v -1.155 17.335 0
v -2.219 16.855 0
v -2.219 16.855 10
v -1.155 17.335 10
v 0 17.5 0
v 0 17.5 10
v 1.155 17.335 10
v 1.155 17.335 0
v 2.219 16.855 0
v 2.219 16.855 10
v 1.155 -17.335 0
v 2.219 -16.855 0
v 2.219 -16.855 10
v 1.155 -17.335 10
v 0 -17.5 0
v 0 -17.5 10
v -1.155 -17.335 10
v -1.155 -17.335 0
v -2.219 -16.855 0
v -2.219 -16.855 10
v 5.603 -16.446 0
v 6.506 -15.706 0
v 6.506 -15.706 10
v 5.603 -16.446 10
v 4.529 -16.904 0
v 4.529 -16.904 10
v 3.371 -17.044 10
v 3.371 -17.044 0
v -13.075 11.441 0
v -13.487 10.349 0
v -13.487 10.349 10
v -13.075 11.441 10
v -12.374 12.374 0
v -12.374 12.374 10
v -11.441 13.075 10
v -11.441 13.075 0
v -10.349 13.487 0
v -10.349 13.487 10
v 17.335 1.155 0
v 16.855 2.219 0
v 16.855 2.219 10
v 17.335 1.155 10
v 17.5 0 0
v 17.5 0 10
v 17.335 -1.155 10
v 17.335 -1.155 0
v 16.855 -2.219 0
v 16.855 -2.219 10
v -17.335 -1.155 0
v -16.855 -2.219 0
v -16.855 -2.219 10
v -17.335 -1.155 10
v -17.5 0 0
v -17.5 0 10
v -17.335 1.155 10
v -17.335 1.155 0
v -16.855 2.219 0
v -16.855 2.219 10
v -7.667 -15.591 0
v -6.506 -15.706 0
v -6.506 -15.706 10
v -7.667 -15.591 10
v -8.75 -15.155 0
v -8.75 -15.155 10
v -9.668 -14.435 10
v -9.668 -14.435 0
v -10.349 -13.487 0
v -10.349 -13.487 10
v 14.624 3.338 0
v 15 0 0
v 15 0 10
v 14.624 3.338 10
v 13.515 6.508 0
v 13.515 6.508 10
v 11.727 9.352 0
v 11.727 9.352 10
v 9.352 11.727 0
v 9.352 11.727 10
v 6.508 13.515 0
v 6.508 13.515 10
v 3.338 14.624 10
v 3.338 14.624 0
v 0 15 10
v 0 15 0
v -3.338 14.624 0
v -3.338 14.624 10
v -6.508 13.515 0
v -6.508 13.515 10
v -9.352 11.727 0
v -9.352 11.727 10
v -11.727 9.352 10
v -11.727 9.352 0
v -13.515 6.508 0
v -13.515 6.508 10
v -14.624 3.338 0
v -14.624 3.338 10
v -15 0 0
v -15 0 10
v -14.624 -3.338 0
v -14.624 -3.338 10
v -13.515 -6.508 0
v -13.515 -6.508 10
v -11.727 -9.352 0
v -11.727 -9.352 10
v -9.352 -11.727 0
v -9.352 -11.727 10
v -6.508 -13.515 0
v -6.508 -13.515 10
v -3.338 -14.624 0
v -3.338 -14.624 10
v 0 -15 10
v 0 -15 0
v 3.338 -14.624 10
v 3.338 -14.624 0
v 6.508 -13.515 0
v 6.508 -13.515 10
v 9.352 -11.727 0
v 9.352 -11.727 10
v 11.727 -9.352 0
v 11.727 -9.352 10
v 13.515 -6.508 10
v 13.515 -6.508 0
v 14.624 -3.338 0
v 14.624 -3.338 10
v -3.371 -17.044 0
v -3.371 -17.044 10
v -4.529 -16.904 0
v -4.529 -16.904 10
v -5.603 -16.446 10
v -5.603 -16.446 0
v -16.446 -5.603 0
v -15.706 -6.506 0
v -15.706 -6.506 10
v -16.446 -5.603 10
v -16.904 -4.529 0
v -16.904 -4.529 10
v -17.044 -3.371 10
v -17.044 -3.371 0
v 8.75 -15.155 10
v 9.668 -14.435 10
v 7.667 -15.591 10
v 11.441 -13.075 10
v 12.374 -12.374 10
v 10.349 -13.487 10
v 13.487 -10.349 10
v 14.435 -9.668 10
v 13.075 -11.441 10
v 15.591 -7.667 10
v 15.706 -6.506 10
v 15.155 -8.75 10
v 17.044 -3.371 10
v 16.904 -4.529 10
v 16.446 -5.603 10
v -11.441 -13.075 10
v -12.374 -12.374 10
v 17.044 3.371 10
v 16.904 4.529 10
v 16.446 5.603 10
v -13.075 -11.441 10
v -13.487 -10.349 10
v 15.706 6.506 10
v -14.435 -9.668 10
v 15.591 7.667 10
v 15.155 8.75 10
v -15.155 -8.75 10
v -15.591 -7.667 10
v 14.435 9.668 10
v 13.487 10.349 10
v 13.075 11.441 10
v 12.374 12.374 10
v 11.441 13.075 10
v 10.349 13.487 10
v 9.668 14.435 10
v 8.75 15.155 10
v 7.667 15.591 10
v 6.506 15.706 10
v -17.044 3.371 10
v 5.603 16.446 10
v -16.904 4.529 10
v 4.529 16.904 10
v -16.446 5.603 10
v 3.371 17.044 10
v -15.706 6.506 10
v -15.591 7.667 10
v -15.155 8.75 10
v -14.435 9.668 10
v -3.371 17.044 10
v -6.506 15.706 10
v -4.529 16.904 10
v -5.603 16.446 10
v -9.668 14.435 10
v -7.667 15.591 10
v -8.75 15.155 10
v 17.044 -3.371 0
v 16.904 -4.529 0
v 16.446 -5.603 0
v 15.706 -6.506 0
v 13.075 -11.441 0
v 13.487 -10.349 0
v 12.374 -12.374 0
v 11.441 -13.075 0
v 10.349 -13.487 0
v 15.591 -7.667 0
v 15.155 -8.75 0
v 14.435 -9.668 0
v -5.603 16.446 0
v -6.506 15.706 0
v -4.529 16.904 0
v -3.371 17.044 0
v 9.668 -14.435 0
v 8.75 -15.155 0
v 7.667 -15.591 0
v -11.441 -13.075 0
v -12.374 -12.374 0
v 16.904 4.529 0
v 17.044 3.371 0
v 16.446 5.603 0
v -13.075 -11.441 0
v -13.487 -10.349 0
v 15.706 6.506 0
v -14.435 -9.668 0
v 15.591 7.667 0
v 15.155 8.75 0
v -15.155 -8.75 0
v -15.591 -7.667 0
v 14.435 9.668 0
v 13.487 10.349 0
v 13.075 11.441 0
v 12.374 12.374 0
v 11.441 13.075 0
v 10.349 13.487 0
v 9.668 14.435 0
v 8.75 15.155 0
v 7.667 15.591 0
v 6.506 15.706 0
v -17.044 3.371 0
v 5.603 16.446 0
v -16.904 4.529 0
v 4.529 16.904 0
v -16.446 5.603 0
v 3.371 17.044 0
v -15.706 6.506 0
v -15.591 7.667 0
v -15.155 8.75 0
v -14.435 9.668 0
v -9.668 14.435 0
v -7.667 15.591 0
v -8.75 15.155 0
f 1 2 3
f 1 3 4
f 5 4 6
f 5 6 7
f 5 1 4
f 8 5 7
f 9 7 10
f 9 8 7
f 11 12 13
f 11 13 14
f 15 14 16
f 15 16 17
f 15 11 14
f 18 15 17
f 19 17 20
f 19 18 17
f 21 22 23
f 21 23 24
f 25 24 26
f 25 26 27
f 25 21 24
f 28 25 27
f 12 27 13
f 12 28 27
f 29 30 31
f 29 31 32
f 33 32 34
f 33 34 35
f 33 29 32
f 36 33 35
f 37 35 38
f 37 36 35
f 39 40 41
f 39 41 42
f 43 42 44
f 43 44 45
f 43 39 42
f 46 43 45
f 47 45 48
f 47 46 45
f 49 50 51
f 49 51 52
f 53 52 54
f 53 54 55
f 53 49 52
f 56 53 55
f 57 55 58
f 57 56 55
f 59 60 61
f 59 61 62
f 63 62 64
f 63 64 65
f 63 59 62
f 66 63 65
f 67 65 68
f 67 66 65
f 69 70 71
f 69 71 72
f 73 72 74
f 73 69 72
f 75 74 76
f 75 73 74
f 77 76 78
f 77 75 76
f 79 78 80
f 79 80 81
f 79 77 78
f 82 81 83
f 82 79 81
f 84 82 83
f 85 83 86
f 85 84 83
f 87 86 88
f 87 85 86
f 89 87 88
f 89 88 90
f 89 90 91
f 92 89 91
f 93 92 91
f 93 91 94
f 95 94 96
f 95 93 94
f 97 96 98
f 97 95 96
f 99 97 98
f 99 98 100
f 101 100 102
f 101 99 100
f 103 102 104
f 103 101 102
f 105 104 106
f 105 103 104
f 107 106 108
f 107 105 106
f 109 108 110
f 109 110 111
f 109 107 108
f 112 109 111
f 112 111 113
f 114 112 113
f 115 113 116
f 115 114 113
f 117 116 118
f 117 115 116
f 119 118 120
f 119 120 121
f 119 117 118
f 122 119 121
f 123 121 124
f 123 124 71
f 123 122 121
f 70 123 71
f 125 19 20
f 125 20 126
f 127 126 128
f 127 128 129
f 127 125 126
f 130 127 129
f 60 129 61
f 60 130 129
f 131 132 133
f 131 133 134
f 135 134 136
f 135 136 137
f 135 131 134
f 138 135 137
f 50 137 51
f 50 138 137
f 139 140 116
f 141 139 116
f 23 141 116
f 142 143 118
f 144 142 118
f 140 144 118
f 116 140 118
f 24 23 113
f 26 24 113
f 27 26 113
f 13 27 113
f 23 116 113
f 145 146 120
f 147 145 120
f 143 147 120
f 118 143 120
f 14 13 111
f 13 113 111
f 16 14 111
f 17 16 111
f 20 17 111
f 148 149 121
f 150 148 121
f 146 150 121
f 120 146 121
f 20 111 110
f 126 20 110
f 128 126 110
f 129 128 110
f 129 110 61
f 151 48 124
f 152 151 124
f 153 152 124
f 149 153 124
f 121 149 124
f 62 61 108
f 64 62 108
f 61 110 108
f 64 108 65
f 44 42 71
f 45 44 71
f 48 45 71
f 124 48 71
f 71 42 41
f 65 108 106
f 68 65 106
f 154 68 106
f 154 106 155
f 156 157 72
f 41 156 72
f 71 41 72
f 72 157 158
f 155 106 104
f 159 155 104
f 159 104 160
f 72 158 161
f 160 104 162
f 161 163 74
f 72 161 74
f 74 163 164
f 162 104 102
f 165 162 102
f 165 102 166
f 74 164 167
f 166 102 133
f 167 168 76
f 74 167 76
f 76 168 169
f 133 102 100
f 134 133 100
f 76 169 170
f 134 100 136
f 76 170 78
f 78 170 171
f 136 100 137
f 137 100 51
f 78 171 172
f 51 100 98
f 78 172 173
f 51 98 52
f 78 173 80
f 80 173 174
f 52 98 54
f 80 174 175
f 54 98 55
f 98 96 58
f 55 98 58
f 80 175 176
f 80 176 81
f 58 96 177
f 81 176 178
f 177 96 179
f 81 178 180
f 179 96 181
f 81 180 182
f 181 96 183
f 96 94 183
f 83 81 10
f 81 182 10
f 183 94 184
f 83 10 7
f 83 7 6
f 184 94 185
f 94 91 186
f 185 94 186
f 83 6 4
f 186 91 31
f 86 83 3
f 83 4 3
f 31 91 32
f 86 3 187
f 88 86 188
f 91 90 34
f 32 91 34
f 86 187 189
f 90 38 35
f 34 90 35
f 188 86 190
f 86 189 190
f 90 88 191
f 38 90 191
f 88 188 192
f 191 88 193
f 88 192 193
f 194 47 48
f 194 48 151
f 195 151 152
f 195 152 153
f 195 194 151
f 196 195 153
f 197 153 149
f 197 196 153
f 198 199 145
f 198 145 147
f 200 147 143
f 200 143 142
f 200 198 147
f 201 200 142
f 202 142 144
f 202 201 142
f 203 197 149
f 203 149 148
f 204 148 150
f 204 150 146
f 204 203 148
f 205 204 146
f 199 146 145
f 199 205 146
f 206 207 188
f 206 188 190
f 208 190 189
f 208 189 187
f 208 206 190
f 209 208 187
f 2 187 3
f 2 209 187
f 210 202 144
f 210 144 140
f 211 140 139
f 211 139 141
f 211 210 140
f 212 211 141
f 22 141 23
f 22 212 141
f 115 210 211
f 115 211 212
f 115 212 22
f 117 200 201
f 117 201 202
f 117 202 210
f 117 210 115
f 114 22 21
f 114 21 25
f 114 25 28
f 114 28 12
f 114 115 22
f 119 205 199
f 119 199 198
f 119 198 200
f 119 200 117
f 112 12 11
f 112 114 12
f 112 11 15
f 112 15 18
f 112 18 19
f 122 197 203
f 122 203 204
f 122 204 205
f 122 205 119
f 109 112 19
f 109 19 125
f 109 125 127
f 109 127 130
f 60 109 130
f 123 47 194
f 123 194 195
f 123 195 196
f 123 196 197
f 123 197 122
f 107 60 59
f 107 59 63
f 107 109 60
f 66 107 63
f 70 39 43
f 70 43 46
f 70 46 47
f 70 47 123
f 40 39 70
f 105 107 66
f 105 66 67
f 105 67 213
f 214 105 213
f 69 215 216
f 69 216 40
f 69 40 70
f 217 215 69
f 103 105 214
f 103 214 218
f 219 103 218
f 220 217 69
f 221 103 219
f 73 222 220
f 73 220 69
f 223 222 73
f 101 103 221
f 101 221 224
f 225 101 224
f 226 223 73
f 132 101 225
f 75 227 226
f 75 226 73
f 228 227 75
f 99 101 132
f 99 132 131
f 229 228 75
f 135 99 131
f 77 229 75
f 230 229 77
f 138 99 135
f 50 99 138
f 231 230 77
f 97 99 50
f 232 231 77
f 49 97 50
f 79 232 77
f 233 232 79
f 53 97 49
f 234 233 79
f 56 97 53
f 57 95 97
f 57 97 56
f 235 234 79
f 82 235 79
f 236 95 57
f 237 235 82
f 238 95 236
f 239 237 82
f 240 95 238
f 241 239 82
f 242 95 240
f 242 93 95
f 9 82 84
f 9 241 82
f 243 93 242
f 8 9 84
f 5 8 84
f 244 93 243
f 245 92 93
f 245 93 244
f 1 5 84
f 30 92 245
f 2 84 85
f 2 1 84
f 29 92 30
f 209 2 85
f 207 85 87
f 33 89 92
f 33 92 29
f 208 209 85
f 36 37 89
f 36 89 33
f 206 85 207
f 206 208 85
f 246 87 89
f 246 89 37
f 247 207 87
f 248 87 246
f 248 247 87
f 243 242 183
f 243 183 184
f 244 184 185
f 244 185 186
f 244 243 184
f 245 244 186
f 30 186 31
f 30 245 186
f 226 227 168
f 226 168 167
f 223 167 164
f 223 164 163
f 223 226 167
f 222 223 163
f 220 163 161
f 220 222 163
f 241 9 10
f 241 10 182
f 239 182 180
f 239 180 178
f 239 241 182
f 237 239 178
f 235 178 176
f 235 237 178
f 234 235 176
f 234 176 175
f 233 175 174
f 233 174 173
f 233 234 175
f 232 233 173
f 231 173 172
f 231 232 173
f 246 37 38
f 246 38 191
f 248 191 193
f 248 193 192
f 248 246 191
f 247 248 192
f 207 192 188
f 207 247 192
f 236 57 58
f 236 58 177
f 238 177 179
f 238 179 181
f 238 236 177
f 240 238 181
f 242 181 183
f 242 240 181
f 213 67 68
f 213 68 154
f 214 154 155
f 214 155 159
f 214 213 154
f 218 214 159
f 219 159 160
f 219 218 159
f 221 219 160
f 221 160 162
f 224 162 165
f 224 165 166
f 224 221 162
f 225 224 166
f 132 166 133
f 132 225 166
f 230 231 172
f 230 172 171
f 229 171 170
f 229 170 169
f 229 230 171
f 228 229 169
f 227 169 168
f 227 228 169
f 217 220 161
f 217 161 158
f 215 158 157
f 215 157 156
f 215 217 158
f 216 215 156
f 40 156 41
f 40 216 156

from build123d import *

# Parameters (mm, degrees)
SKETCH1_R           = 17
SKETCH1_R_2         = 15
BOSS_EXTRUDE1_DEPTH = 10
BOSS_EXTRUDE2_START = -10
BOSS_EXTRUDE2_DEPTH = 10
CIRPATTERN1_COUNT   = 24


with BuildPart() as part:
    # Sketch1 → Boss-Extrude1 (new body)
    with BuildSketch(Plane.XY):
        Circle(SKETCH1_R)
        Circle(SKETCH1_R_2, mode=Mode.SUBTRACT)
    extrude(amount=BOSS_EXTRUDE1_DEPTH)

    # Sketch2 → Boss-Extrude2 (add)
    with BuildSketch(Plane.XY.offset(10).offset(BOSS_EXTRUDE2_START)):
        with BuildLine():
            ThreePointArc((-2.218945268, 16.854562643), (0, 17.5), (2.218945268, 16.854562643))
            ThreePointArc((2.218945268, 16.854562643), (0, 17), (-2.218945268, 16.854562643))
        make_face()
    boss_extrude2 = extrude(amount=BOSS_EXTRUDE2_DEPTH)

    # CirPattern1: Boss-Extrude2 ×24 about axis
    cirpattern1_axis = Axis((0, 0, 0), (0, 0, 1))
    for i in range(1, CIRPATTERN1_COUNT):
        add(boss_extrude2.rotate(cirpattern1_axis, i * 360 / CIRPATTERN1_COUNT))


solid = part.part
